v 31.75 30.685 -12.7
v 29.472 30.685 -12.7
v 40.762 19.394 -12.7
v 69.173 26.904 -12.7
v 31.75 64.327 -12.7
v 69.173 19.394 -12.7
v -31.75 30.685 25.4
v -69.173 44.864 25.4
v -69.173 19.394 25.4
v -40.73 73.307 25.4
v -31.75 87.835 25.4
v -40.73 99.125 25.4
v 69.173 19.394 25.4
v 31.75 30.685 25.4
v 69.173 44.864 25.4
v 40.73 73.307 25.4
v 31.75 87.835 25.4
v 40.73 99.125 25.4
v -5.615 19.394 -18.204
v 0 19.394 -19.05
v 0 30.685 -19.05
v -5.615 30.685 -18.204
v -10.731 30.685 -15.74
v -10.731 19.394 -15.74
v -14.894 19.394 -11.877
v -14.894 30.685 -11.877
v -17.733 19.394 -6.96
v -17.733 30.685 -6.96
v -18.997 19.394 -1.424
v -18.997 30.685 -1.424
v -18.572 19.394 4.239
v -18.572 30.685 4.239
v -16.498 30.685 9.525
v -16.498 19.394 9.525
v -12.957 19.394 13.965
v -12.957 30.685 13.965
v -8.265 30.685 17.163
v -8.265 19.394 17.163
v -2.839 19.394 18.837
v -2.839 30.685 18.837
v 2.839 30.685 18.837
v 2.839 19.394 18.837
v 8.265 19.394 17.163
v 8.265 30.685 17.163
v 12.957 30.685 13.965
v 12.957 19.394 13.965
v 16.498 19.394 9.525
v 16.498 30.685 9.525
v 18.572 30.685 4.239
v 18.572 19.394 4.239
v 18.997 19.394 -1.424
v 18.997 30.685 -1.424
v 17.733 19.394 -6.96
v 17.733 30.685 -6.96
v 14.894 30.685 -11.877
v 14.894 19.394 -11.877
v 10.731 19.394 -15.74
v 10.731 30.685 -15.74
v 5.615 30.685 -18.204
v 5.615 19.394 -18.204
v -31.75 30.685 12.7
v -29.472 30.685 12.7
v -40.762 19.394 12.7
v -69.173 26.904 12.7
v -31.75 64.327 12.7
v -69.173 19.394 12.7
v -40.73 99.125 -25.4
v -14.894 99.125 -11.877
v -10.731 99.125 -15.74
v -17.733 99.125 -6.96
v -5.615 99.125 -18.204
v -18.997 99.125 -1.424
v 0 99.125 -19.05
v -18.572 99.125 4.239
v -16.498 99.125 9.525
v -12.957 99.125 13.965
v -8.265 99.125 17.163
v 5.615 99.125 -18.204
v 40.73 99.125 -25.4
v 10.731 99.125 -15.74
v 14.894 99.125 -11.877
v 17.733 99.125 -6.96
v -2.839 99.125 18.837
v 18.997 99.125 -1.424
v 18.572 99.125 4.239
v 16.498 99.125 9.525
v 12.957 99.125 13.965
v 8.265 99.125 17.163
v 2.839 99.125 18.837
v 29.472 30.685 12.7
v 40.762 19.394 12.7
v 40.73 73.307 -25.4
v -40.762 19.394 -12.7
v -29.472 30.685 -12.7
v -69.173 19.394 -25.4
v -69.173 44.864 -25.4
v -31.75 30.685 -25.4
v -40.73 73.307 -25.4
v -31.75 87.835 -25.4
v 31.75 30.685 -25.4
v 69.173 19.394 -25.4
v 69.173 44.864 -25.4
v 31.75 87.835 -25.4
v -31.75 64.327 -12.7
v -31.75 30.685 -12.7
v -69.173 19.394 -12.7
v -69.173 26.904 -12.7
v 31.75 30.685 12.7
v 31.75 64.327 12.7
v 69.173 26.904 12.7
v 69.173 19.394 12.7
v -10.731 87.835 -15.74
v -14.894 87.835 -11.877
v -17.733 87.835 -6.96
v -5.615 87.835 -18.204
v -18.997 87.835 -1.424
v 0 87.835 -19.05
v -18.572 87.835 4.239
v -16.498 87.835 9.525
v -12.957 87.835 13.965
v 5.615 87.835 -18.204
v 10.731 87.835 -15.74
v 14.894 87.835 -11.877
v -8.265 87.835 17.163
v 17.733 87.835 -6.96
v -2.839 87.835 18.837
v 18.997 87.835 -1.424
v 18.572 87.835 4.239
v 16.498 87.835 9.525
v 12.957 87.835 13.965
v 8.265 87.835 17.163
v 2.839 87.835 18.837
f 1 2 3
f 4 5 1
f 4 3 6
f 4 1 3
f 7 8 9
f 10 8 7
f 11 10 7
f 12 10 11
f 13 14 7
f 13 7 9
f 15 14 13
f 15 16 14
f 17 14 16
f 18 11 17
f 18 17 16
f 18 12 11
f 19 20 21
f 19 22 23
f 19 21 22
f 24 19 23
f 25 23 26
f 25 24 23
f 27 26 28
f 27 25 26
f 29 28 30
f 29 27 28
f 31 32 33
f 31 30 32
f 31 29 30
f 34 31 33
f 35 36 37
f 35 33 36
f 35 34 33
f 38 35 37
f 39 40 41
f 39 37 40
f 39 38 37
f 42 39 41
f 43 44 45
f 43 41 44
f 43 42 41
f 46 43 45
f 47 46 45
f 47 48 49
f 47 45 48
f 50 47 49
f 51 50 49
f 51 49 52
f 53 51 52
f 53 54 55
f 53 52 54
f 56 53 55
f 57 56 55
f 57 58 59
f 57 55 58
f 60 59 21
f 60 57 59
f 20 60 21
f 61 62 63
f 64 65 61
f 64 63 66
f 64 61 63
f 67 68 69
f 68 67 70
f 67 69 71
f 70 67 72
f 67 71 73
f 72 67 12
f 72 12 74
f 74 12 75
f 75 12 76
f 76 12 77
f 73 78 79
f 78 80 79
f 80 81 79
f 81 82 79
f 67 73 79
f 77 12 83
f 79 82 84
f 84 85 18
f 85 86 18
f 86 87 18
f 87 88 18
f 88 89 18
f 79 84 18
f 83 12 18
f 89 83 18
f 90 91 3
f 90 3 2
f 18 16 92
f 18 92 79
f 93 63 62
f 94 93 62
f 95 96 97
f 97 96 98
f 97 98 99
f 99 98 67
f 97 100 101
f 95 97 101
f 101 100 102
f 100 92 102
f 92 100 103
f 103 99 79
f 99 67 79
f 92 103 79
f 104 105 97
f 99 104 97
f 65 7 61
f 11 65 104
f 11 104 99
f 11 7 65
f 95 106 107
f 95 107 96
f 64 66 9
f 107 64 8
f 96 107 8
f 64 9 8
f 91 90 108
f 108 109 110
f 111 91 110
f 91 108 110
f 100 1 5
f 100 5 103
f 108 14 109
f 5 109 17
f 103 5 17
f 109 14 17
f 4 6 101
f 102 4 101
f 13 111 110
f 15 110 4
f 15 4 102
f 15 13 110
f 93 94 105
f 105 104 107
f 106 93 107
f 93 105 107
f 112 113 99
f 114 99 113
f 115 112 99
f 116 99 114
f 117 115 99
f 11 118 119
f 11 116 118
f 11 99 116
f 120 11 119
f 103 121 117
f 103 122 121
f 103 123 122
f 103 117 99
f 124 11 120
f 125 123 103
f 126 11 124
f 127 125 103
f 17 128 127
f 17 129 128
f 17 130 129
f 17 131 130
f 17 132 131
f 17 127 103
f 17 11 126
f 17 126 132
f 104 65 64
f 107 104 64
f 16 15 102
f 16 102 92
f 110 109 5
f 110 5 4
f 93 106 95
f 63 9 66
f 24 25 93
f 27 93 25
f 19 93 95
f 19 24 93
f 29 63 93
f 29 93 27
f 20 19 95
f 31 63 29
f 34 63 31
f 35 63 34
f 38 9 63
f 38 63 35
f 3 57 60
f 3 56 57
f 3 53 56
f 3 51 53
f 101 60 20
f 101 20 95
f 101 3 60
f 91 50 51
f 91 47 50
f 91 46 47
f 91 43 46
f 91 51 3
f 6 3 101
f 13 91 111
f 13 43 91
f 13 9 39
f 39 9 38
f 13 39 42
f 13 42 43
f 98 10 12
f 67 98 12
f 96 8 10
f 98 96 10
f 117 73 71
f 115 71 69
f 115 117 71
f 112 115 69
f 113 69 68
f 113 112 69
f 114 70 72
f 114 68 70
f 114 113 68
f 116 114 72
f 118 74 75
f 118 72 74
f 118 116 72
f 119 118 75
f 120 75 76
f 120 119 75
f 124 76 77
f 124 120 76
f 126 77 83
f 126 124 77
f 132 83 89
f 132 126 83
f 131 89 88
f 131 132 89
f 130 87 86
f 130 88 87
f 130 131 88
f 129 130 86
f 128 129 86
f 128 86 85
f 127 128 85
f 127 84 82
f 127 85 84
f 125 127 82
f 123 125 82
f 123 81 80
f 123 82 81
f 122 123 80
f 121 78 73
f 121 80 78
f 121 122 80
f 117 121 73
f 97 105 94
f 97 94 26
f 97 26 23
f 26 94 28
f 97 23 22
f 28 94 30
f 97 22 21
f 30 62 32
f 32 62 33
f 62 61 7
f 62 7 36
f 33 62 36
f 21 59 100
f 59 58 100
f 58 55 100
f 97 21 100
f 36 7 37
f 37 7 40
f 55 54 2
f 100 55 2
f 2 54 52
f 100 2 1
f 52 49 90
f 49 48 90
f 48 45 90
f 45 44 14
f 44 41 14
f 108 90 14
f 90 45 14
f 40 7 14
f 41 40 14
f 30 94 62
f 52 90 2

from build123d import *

# Parameters (mm, degrees)
SKETCH2_R           = 19.05
BOSS_EXTRUDE1_DEPTH = 152.4
BOSS_EXTRUDE2_DEPTH = 12.7
SKETCH4_W           = 138.346275672
SKETCH4_H           = 79.731841005
BOSS_EXTRUDE3_DEPTH = 50.8
SKETCH5_W           = 63.5
SKETCH5_H           = 57.15
CUT_EXTRUDE1_DEPTH  = 132.116075905
CUT_EXTRUDE2_DEPTH  = 132.116075905


with BuildPart() as part:
    # Sketch2 → Boss-Extrude1 (new body)
    with BuildSketch(Plane(origin=(0, 0, 0), x_dir=(1, 0, 0), z_dir=(0, 1, 0))):
        Circle(SKETCH2_R)
    extrude(amount=BOSS_EXTRUDE1_DEPTH)

    # Sketch3 → Boss-Extrude2 (add, symmetric)
    with BuildSketch(Plane.XY):
        Polygon((11.93183673, 72.08792673), (-6.028675512, 90.048438972), (-427.750314484, -331.6732), (-391.82929, -331.6732), align=None)
    boss_extrude2 = extrude(amount=BOSS_EXTRUDE2_DEPTH, both=True)

    # Mirror1: Boss-Extrude2 across plane
    add(boss_extrude2.mirror(Plane(origin=(0, 0, 0), x_dir=(0, 0, 1), z_dir=(1, 0, 0))))


with BuildPart() as body_2:
    # Sketch4 → Boss-Extrude3 (new body)
    with BuildSketch(Plane.XY.offset(25.4)):
        with Locations((0, 59.259567455)):
            Rectangle(SKETCH4_W, SKETCH4_H)
    extrude(amount=-BOSS_EXTRUDE3_DEPTH)

    # Combine1: cut part
    add(part.part, mode=Mode.SUBTRACT)

    # Sketch5 → Cut-Extrude1 (cut, through all)
    with BuildSketch(Plane.XY.offset(25.4)):
        with Locations((0, 59.259567454)):
            Rectangle(SKETCH5_W, SKETCH5_H)
    extrude(amount=-CUT_EXTRUDE1_DEPTH, mode=Mode.SUBTRACT)

    # Sketch6 → Cut-Extrude2 (cut, through all)
    with BuildSketch(Plane.XY.offset(25.4)):
        Polygon((-69.173137836, 99.125487957), (-69.173137836, 44.864488891), (-40.730256121, 73.307370605), (-40.730256121, 99.125487957), align=None)
    cut_extrude2 = extrude(amount=-CUT_EXTRUDE2_DEPTH, mode=Mode.SUBTRACT)

    # Mirror2: Cut-Extrude2 across plane
    add(cut_extrude2.mirror(Plane(origin=(0, 0, 0), x_dir=(0, 0, 1), z_dir=(1, 0, 0))), mode=Mode.SUBTRACT)


solid = body_2.part
